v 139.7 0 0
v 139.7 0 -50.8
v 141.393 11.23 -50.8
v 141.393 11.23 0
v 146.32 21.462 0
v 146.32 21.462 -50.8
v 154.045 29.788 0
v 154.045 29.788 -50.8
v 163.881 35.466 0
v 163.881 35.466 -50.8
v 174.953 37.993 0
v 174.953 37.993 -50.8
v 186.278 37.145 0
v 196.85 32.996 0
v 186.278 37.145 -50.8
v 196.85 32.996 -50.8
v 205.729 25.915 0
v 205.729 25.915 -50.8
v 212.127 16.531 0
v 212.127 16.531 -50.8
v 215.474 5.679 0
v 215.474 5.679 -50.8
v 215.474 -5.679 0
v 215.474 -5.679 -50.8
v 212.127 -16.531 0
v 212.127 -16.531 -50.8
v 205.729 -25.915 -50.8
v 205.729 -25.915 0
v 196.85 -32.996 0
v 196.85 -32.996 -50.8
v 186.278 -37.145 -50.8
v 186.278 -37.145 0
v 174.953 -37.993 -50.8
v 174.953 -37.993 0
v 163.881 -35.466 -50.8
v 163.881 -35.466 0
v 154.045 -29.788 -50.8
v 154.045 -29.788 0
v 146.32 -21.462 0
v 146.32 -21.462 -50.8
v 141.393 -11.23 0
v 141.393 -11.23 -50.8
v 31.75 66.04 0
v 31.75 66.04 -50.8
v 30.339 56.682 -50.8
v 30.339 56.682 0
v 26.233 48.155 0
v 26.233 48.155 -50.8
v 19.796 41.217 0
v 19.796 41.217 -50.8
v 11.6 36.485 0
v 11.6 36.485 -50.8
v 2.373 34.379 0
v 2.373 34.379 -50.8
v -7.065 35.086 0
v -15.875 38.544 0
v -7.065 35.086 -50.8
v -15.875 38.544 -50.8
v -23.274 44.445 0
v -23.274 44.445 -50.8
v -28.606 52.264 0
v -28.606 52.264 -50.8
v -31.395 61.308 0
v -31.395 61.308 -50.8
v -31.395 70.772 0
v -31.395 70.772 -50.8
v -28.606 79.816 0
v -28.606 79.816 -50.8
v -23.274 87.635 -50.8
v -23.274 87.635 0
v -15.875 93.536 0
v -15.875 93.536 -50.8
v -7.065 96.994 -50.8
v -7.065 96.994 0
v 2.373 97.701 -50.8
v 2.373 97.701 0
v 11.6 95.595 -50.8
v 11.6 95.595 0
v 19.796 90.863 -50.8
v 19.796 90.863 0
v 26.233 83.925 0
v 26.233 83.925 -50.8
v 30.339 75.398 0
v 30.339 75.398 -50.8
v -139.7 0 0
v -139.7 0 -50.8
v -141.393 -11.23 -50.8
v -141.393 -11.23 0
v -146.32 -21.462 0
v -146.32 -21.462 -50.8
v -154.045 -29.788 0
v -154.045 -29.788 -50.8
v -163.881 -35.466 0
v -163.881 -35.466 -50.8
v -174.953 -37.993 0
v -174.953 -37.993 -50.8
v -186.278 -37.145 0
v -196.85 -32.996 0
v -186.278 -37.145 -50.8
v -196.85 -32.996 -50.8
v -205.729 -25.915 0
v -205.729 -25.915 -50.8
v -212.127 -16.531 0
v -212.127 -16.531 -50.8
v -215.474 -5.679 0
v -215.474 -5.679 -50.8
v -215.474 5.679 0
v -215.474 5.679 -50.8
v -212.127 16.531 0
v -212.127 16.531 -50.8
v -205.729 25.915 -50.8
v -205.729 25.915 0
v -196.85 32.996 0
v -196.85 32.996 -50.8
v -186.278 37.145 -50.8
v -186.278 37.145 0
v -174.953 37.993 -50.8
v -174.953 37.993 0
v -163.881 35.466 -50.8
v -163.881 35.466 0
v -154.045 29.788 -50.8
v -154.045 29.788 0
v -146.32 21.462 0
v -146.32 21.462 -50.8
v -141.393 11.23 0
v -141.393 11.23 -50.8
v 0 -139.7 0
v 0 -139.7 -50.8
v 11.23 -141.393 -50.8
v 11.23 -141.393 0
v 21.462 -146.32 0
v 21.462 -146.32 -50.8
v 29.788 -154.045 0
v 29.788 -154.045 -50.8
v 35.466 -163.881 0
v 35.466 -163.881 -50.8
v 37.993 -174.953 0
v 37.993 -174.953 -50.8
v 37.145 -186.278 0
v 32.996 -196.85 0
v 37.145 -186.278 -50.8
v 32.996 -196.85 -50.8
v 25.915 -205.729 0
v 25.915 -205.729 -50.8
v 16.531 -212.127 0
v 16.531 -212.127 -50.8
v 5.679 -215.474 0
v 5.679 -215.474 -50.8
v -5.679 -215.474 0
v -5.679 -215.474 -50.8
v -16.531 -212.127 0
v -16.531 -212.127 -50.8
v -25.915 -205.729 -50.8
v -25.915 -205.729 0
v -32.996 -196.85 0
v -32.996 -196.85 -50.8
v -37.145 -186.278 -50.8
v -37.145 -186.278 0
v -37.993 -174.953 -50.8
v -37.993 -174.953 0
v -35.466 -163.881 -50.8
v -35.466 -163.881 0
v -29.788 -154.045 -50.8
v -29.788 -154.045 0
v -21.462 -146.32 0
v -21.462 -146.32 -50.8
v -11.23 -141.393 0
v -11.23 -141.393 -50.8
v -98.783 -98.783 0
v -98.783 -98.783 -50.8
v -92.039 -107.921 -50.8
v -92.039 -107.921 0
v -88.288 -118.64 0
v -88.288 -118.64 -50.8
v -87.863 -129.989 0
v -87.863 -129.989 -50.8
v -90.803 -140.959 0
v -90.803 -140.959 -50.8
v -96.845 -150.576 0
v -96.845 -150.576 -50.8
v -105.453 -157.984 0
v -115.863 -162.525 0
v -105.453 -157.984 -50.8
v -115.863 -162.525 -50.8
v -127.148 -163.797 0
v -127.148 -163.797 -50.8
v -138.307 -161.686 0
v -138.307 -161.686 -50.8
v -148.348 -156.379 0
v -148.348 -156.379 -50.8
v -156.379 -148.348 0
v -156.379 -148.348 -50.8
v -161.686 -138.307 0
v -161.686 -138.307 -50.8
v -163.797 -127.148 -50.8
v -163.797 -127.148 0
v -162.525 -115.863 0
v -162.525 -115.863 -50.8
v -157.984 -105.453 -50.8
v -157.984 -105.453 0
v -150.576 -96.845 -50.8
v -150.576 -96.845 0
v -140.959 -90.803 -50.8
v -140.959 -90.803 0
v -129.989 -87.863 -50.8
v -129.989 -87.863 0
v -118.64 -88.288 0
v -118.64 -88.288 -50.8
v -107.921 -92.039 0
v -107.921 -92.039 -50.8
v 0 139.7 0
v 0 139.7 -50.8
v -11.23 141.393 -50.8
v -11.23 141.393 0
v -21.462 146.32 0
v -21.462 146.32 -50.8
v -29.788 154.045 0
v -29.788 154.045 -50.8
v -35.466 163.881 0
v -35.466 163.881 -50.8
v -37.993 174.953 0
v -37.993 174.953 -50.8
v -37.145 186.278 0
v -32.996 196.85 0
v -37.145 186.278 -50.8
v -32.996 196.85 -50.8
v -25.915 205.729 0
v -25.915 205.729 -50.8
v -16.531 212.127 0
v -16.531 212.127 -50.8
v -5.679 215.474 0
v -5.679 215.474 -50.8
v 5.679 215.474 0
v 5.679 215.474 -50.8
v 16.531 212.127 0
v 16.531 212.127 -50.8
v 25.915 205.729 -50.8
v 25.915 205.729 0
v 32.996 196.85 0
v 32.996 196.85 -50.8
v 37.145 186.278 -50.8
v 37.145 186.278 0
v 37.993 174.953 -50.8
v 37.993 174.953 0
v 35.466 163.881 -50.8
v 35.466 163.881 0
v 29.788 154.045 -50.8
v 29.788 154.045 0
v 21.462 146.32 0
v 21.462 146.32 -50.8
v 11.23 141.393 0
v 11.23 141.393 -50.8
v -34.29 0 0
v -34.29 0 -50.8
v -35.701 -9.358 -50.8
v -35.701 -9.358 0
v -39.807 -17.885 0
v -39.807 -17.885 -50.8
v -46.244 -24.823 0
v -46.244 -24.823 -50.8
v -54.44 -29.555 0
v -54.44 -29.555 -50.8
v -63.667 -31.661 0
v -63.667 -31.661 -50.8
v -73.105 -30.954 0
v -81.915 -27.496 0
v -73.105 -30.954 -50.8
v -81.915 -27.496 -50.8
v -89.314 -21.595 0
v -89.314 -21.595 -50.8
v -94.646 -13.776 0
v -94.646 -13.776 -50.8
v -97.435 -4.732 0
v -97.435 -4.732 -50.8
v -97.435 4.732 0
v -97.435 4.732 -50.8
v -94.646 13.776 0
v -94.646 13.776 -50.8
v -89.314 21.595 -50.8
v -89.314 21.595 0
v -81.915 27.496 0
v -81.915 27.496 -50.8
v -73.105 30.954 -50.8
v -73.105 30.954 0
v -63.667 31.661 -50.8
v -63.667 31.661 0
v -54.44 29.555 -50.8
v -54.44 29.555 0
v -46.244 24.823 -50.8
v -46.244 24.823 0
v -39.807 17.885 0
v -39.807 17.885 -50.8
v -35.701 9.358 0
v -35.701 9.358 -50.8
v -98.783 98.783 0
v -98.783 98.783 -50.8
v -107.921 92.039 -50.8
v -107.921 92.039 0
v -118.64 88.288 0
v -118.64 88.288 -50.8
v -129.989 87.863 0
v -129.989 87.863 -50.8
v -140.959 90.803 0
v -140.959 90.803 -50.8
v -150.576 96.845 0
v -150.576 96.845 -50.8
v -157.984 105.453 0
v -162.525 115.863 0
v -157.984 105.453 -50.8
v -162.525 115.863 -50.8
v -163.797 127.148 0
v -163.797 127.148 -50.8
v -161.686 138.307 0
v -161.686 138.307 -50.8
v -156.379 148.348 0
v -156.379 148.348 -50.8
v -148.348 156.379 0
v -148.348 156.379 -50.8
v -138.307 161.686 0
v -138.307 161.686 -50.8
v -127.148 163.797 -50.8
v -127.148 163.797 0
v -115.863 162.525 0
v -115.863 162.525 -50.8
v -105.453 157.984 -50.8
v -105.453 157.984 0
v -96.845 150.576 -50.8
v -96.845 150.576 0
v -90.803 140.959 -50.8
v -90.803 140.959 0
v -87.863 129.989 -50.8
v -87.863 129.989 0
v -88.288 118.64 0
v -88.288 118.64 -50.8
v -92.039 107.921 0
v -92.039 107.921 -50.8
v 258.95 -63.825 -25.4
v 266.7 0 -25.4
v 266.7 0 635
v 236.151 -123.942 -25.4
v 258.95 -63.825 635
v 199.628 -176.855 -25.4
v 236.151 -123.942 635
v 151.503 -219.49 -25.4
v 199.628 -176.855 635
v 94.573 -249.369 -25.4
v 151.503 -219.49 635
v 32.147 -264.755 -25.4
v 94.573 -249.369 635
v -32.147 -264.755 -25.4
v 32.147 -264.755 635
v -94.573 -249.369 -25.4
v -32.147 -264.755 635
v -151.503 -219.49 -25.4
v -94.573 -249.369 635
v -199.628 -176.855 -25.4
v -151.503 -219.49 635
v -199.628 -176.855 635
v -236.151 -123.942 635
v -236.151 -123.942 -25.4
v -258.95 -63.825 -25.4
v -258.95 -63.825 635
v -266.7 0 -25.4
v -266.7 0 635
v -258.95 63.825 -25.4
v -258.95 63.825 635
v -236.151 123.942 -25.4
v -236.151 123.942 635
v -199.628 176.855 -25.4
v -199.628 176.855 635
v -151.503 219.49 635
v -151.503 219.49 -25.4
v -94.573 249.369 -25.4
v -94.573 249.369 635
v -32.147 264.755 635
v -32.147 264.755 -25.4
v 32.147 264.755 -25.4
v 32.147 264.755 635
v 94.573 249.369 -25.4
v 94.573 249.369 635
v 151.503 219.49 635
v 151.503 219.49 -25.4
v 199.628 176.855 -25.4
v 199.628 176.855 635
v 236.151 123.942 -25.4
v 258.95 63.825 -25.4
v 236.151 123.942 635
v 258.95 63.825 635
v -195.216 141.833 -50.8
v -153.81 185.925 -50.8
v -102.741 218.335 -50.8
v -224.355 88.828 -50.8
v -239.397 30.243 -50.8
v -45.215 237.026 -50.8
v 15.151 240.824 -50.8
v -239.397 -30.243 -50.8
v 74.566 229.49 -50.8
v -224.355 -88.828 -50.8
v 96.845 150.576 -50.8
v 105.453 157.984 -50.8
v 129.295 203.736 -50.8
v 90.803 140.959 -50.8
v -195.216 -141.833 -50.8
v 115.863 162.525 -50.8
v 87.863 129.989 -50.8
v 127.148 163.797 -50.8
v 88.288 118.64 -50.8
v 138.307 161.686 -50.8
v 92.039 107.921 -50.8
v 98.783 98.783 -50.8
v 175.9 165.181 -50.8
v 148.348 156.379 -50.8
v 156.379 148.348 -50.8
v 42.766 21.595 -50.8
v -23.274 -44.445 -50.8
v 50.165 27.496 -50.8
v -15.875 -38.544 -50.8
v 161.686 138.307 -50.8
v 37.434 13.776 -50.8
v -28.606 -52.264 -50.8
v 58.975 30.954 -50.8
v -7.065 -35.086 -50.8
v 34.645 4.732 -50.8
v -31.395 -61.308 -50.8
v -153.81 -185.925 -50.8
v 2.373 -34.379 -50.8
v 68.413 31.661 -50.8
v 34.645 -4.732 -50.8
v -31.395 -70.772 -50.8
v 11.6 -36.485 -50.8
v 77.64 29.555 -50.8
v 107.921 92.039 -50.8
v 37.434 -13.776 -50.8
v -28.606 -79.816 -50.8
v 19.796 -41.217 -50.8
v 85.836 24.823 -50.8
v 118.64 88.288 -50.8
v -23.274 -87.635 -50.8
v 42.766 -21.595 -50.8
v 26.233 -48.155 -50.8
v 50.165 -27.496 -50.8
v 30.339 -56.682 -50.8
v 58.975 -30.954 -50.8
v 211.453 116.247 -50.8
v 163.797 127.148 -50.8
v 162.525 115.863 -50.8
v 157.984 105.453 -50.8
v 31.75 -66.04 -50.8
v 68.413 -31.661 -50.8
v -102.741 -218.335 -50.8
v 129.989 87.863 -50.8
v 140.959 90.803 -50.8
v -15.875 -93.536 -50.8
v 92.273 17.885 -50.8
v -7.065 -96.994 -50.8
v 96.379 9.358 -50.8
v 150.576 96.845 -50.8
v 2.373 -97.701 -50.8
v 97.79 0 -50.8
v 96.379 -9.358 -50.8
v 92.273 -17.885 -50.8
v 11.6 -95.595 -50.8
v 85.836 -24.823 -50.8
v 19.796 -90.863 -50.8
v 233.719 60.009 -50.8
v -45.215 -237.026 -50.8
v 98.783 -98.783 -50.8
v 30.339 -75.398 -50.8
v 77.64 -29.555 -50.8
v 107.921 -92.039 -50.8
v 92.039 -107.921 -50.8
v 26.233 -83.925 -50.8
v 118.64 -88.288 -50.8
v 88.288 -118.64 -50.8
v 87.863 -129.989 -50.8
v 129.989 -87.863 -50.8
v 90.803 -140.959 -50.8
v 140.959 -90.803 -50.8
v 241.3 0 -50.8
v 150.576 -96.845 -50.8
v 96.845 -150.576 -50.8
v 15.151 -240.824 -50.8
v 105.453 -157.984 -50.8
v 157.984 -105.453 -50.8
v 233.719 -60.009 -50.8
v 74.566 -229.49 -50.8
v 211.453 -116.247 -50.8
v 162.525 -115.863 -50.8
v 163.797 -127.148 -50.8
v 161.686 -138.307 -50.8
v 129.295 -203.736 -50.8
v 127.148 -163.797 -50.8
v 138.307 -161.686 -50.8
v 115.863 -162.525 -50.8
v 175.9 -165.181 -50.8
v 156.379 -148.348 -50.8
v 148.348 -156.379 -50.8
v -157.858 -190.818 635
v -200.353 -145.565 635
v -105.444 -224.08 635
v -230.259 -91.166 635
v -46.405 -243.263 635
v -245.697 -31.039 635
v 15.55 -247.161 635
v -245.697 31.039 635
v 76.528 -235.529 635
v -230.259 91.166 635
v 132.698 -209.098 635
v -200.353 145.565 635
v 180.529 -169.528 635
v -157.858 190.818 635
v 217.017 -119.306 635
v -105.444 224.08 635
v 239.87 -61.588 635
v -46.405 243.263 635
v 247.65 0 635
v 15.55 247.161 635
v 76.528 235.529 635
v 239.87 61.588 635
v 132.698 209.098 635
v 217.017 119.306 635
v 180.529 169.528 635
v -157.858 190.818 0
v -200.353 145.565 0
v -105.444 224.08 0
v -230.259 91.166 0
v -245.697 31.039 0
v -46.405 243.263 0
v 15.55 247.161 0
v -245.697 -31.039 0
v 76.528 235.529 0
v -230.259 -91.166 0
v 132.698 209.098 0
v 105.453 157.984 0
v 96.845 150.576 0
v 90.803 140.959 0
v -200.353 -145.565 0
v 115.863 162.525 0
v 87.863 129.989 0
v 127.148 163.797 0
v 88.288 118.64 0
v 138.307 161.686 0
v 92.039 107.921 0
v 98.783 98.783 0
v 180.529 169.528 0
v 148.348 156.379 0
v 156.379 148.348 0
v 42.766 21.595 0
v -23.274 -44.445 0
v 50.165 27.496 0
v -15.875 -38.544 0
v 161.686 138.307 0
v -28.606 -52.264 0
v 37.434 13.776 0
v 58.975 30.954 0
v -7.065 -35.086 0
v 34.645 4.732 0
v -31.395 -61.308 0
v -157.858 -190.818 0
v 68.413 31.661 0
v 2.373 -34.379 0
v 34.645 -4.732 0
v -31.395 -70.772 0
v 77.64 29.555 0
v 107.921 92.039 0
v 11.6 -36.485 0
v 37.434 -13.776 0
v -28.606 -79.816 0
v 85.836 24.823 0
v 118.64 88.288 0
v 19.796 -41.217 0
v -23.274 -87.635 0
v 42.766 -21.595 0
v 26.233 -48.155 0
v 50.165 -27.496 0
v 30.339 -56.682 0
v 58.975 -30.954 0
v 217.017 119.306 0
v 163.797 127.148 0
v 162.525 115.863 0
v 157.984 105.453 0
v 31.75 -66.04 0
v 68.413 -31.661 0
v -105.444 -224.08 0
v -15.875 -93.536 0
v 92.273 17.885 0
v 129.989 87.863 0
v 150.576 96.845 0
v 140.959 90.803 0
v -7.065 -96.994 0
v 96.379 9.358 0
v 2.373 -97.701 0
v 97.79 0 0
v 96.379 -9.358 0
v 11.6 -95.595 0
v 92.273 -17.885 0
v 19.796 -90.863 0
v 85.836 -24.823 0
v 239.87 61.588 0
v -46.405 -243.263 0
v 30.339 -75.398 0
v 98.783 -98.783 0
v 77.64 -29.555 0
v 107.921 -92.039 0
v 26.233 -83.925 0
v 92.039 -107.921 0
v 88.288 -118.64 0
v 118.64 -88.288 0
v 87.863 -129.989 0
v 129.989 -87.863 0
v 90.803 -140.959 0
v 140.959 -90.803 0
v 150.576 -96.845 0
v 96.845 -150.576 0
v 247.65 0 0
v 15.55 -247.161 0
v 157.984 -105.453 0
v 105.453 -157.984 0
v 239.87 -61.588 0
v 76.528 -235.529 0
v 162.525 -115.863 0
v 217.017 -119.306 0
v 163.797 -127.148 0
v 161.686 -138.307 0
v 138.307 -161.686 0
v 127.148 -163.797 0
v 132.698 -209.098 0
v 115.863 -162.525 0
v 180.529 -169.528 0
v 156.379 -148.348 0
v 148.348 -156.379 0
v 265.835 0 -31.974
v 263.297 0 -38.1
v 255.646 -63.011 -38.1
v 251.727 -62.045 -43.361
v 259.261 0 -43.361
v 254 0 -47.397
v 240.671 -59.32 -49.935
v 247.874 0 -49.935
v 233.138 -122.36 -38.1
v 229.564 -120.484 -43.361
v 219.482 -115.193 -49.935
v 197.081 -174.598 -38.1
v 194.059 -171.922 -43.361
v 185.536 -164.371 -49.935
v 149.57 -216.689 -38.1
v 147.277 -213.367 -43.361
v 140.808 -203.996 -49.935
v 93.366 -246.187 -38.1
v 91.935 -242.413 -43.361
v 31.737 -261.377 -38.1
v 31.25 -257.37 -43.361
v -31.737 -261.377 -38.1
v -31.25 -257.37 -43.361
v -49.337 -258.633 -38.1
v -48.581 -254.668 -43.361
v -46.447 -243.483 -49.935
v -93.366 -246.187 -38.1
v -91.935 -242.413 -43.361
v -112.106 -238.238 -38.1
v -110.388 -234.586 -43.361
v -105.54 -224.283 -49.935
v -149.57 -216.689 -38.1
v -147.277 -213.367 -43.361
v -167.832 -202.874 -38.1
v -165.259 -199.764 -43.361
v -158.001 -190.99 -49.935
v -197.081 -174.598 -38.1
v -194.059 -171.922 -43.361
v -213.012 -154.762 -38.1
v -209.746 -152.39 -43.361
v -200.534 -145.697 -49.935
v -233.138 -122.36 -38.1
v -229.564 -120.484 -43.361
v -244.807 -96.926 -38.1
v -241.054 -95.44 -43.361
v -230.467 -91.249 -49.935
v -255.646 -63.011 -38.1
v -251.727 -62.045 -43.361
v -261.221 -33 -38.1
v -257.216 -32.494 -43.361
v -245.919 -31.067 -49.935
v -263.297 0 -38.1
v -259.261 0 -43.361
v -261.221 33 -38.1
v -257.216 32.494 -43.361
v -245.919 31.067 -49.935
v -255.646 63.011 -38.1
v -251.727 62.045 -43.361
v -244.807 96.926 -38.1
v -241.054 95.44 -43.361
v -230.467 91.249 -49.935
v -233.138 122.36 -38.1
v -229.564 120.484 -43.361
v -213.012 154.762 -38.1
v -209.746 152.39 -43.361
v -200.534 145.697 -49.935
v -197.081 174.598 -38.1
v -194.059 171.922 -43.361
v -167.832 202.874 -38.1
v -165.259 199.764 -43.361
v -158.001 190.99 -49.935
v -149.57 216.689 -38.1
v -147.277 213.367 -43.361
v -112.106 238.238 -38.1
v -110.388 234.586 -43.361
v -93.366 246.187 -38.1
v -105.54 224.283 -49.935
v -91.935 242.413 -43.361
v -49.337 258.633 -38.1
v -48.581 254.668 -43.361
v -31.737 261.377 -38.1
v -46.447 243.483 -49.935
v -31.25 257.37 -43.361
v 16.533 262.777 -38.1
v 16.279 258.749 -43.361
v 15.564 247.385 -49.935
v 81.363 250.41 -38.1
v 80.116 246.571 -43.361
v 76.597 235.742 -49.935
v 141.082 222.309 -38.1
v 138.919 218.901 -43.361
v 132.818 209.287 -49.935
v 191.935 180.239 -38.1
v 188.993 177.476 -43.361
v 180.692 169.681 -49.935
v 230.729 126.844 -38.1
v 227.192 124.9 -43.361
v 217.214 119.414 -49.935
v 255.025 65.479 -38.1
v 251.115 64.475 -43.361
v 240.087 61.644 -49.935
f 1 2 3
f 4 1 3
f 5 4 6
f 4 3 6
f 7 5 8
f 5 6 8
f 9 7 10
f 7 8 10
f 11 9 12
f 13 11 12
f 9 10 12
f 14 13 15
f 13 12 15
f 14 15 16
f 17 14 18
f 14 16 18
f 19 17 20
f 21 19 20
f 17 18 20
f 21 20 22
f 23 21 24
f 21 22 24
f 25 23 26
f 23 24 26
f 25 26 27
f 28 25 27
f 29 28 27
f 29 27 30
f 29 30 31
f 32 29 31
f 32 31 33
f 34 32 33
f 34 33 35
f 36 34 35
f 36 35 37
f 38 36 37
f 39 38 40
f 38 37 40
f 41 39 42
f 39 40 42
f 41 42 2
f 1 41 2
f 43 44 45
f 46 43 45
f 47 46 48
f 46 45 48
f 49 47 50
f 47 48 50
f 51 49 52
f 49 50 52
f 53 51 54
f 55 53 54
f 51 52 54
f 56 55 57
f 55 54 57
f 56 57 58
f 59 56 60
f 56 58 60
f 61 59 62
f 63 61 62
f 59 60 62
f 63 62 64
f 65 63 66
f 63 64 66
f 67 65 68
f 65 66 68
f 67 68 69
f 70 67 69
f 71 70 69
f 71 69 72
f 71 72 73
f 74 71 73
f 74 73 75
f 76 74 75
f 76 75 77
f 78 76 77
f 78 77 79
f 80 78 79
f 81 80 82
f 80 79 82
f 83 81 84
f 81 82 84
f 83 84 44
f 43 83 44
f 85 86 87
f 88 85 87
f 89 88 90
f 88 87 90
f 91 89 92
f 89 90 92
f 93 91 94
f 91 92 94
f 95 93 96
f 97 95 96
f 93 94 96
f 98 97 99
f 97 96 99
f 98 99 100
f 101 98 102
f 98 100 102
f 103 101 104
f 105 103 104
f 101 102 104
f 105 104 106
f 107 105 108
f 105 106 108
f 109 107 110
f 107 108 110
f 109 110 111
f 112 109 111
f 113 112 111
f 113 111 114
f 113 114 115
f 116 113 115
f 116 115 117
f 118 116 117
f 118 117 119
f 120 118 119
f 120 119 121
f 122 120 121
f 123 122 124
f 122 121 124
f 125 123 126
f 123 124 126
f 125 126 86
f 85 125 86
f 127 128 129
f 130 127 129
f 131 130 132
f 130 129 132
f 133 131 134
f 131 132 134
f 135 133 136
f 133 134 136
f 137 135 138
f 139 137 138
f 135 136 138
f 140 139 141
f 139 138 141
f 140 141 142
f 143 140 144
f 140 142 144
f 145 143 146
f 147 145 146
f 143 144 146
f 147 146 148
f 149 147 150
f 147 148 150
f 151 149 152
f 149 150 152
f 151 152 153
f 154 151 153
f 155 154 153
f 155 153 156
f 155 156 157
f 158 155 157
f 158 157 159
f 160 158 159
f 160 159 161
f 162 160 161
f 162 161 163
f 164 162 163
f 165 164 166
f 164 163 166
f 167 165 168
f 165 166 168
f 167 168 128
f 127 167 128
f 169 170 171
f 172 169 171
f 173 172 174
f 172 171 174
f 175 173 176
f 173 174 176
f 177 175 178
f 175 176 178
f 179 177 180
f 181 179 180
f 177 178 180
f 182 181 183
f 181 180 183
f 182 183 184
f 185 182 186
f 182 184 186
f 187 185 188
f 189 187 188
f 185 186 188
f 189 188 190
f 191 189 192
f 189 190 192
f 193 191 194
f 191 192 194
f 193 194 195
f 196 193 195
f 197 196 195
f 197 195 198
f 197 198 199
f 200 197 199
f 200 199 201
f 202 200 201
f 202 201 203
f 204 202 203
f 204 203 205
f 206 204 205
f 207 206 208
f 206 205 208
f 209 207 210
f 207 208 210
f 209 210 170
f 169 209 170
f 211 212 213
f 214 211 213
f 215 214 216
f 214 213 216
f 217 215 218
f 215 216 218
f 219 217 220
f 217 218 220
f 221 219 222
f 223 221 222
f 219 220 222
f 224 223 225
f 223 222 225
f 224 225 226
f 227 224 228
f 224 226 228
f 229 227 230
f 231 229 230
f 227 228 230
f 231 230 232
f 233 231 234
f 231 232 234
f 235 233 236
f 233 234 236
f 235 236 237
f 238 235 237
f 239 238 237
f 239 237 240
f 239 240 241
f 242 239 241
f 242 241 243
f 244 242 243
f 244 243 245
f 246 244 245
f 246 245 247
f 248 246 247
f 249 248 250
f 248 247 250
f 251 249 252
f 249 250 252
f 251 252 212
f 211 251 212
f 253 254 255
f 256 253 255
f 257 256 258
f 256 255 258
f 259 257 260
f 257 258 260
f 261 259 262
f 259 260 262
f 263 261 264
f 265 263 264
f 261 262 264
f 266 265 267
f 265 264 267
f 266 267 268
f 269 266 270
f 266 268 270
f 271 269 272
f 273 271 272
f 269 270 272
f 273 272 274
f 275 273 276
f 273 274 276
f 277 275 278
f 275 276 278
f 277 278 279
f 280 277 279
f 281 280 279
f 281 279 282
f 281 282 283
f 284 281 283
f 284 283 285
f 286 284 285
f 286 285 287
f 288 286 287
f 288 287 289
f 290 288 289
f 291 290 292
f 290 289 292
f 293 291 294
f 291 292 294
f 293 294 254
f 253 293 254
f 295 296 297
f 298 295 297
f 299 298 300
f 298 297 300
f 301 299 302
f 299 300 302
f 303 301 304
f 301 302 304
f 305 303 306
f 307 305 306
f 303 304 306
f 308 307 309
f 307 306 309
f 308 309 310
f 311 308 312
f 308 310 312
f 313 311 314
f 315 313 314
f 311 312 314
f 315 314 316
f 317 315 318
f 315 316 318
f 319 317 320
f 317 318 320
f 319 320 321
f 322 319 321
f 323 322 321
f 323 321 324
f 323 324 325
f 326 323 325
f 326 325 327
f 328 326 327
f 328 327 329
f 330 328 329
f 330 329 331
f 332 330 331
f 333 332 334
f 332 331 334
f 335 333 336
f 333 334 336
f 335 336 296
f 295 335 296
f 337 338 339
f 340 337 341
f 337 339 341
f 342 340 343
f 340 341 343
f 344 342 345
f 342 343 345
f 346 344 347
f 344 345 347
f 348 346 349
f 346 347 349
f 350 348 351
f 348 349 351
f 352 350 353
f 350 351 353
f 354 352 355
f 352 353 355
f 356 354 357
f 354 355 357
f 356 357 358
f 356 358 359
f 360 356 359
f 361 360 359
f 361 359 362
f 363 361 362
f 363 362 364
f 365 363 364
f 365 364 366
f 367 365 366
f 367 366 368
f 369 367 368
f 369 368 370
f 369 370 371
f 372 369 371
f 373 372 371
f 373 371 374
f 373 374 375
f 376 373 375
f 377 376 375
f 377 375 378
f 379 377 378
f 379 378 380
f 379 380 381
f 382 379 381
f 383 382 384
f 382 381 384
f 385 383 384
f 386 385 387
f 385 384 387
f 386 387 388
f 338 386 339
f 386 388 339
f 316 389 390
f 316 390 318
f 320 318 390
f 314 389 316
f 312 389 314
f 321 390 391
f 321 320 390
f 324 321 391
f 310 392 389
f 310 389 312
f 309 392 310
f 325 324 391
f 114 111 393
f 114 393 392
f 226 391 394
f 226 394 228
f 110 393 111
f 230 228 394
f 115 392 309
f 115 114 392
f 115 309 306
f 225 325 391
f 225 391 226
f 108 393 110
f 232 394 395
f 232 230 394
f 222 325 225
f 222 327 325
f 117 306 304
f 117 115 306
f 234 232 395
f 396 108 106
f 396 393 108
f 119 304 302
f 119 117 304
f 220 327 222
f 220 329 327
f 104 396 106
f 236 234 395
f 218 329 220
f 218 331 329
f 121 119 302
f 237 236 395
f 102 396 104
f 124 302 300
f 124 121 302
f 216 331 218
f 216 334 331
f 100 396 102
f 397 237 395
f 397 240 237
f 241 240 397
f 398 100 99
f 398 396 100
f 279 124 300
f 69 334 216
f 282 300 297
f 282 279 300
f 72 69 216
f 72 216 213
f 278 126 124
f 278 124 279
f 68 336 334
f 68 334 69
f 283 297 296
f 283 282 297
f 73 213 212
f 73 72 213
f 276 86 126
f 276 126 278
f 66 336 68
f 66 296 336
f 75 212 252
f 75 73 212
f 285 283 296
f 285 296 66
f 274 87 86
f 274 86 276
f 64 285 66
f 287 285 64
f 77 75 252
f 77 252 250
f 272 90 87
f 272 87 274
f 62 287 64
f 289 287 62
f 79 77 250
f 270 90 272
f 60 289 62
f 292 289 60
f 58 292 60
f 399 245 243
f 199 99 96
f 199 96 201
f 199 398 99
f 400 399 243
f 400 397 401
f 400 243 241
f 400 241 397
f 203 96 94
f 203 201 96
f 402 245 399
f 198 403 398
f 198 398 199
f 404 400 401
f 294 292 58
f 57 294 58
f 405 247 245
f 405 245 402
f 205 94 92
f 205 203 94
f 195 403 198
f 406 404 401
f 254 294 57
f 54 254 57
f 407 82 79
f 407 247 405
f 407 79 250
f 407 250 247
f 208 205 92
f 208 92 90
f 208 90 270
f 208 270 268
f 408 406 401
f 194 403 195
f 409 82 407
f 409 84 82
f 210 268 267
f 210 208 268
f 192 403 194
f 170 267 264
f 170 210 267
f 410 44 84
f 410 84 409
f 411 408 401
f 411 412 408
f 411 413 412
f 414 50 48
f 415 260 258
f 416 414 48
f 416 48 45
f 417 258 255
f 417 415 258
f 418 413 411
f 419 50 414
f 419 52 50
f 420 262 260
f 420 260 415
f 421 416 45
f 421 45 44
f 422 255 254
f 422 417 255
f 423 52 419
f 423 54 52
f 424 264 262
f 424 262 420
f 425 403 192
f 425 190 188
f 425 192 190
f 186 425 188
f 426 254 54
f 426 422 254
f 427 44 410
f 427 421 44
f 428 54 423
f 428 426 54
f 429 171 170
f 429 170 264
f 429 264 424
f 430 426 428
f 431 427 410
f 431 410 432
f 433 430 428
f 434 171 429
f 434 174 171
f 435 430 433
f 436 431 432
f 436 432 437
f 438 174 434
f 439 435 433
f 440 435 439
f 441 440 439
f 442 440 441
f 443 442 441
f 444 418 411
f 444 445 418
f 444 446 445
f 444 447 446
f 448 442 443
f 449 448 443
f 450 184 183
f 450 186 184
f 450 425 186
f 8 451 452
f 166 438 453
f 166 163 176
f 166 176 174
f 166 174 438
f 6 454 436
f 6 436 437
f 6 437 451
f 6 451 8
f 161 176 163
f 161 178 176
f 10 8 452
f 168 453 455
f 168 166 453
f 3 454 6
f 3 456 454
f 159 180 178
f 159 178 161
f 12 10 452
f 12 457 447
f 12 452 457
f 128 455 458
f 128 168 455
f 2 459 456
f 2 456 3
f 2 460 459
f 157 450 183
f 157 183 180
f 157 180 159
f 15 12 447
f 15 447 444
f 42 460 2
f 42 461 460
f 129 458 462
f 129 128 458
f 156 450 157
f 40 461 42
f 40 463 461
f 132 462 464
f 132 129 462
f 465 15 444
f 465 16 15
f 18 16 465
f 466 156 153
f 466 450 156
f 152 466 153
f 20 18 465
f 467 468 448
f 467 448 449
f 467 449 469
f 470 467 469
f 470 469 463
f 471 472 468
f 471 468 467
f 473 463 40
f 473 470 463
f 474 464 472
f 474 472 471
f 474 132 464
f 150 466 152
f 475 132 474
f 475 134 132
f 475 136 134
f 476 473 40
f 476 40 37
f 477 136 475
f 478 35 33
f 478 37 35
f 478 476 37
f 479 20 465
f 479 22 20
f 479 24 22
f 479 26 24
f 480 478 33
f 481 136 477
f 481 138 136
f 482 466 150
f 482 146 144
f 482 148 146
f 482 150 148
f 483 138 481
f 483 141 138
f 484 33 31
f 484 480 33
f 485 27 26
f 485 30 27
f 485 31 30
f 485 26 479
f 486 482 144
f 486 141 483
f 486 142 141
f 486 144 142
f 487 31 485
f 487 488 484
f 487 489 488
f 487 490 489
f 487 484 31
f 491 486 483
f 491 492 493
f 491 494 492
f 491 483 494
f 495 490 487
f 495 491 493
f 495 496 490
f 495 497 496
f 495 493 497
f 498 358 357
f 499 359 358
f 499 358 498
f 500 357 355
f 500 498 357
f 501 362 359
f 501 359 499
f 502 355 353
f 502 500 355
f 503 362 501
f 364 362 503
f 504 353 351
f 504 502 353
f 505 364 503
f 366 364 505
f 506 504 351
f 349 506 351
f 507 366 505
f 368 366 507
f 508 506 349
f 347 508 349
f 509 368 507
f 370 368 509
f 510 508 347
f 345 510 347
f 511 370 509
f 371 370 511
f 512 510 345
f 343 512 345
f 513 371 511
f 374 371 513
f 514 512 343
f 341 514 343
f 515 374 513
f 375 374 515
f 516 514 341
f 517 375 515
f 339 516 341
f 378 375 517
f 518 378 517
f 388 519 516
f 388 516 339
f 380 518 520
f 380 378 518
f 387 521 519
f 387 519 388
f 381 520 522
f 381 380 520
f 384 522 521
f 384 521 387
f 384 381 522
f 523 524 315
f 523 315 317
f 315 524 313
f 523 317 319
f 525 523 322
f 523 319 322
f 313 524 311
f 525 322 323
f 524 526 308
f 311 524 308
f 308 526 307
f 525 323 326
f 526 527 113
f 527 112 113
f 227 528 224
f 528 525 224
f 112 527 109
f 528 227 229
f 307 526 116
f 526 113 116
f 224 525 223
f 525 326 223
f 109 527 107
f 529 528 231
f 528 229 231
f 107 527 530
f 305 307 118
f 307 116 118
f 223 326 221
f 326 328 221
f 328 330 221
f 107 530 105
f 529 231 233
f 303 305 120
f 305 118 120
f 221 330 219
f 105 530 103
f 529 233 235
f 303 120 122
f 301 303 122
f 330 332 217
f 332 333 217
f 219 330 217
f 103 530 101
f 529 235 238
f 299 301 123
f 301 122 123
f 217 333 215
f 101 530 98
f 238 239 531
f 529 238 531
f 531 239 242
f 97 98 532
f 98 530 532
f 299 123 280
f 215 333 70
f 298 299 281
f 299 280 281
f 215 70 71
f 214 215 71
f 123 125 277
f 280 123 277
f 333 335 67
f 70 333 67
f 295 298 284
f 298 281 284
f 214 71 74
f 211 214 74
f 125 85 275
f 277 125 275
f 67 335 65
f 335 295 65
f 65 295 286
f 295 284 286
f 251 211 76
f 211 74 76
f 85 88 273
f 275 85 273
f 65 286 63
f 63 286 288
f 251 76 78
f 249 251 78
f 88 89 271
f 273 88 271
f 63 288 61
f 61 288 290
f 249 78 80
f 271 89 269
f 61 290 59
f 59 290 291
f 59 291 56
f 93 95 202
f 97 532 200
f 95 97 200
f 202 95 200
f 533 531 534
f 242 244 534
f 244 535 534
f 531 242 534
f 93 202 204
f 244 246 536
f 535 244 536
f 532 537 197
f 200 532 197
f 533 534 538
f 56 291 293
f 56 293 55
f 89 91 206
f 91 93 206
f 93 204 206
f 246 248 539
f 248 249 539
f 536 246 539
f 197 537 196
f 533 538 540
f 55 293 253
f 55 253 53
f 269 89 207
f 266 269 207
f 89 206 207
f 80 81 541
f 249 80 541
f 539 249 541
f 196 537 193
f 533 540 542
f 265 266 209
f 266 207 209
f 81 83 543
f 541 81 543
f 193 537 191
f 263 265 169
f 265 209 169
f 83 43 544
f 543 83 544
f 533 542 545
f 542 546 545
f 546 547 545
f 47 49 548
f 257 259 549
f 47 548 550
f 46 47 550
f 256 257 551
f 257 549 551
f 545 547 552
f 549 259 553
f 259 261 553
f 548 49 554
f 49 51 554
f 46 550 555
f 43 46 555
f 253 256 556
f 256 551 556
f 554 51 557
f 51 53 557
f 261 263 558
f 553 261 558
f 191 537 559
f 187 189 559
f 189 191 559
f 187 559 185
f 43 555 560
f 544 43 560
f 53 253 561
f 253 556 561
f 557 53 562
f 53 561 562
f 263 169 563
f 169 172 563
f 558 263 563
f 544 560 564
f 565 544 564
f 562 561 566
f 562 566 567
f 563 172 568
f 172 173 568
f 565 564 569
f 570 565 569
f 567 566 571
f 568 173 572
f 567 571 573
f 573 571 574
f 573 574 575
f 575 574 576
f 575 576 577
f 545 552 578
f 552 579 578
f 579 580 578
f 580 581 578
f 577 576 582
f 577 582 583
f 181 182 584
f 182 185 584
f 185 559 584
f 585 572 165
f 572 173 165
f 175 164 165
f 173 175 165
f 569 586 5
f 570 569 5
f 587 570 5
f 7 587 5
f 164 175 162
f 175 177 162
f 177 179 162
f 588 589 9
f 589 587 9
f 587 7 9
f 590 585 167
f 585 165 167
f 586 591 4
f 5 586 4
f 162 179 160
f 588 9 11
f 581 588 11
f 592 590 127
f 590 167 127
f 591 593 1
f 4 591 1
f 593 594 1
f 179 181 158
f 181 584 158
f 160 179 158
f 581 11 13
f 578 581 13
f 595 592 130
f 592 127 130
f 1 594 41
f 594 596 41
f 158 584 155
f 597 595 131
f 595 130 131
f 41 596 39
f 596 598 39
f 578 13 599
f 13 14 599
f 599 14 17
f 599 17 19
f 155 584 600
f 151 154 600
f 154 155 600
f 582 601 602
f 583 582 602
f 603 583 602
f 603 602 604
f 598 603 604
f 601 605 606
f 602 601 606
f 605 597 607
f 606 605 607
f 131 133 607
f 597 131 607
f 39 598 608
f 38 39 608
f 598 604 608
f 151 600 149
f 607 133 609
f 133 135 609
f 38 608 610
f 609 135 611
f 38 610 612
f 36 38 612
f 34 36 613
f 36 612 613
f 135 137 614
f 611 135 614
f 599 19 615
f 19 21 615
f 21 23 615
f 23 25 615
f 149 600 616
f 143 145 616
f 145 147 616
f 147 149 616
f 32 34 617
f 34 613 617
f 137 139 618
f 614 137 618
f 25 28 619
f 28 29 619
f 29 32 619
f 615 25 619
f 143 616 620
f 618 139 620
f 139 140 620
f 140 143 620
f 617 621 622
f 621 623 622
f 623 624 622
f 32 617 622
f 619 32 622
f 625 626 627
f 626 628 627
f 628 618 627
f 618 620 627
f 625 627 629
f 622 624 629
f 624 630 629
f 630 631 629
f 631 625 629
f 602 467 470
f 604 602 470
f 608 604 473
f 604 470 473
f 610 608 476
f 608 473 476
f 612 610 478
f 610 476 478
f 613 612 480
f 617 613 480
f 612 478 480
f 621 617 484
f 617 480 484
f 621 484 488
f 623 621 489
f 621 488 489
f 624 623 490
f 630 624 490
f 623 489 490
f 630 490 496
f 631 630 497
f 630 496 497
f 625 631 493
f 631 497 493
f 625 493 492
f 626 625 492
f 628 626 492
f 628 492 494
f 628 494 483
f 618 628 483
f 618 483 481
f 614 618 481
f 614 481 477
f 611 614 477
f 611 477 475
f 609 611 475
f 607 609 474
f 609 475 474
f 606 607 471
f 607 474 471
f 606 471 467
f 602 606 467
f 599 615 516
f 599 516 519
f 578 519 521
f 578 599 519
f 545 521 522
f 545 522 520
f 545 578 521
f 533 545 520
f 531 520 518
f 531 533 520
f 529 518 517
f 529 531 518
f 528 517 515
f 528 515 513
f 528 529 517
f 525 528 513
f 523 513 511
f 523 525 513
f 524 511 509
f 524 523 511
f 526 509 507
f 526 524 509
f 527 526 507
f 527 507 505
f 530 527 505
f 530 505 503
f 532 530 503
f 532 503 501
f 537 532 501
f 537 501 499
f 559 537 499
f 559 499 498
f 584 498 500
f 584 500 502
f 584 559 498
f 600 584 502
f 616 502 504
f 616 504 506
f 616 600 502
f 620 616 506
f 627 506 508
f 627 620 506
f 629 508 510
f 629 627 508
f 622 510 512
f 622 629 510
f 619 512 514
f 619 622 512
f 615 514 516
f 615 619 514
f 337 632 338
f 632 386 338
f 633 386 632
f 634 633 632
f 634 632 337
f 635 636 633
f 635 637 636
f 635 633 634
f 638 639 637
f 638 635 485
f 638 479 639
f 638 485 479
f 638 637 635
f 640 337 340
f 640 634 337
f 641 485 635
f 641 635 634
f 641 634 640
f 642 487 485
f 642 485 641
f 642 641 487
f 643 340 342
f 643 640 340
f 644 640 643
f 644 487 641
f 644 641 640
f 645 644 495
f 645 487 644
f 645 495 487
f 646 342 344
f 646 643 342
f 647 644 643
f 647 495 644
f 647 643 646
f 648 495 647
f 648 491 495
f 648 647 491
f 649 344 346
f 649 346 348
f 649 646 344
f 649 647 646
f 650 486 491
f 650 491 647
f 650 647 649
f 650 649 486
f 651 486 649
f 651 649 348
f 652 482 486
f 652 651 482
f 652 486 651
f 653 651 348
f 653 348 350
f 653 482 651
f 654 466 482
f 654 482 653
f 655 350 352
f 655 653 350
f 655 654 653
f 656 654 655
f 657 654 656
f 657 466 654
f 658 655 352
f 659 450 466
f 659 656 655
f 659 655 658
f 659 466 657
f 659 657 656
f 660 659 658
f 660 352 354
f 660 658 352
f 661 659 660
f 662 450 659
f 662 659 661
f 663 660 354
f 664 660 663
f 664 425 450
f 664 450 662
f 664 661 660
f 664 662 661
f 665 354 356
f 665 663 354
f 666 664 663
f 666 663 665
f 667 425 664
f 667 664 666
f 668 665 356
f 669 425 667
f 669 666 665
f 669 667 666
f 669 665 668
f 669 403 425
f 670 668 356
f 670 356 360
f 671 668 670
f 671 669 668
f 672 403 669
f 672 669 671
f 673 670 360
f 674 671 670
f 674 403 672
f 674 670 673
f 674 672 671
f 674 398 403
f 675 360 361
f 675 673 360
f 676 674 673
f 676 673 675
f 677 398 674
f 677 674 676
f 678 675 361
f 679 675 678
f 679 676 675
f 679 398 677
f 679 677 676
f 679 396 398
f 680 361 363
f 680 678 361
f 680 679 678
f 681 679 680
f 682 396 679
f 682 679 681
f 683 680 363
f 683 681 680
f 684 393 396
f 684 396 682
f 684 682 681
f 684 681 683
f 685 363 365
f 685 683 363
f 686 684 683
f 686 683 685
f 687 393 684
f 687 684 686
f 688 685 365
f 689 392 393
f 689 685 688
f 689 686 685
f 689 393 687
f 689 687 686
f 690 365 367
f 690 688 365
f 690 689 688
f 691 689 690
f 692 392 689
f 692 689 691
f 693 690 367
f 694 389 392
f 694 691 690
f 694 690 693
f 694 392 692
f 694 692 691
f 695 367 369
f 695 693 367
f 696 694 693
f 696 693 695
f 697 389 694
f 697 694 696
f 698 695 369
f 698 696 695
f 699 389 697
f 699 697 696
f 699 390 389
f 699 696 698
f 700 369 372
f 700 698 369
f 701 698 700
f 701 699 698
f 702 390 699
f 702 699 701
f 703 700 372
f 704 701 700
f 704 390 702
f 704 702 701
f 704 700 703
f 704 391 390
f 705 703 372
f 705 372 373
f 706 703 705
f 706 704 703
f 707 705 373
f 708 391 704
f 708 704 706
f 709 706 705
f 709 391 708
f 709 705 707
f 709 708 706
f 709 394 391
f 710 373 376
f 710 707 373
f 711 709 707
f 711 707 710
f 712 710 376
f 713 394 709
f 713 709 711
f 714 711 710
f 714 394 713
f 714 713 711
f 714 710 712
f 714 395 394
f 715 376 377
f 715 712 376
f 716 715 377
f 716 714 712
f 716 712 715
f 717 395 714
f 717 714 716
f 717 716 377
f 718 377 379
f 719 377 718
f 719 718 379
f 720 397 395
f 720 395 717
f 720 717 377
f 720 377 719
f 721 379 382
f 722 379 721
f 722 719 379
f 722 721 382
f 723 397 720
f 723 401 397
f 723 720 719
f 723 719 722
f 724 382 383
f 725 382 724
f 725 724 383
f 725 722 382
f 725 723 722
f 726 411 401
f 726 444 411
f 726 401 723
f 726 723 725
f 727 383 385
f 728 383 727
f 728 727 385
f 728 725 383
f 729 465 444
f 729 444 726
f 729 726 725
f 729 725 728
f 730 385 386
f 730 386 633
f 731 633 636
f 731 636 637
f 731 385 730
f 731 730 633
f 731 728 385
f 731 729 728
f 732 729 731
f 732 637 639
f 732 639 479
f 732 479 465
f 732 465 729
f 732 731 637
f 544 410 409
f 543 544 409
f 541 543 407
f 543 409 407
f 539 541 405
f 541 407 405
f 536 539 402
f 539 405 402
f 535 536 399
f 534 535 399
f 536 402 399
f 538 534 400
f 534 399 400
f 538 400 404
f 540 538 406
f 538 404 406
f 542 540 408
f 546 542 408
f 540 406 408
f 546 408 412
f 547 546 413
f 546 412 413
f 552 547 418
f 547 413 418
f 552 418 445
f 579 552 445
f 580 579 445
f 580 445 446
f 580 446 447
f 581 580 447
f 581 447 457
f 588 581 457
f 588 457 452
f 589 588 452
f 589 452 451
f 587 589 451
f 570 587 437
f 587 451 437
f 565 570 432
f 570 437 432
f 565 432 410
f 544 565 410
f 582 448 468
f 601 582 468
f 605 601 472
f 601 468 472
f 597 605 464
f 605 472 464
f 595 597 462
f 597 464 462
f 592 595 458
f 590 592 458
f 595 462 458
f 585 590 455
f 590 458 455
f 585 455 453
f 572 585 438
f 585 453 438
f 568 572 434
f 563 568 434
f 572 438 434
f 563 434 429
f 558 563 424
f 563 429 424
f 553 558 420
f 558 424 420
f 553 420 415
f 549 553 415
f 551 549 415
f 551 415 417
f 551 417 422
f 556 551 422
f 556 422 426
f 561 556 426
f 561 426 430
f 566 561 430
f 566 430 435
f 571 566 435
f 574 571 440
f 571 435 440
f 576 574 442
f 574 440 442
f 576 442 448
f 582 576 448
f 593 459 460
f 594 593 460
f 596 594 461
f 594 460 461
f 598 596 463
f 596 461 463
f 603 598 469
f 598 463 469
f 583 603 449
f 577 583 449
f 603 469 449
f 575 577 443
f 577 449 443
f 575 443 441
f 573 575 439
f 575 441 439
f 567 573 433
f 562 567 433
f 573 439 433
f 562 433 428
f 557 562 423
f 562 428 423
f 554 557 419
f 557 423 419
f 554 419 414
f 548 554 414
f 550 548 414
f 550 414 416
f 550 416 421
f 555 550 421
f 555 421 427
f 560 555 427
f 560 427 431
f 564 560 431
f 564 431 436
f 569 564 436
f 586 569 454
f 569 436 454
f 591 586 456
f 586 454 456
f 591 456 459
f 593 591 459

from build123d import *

# Parameters (mm, degrees)
F0_R            = 266.7
F0_R_2          = 247.65
F1_DEPTH        = 635
F2_R            = 266.7
F3_DEPTH        = 50.8
F4_R            = 25.4
F5_R            = 38.1
F7_DEPTH        = 50.8
F7_COPIES_COUNT = 8
F8_R            = 31.75
F9_DEPTH        = 50.8


# Not quite as in the source:
# - a pattern or mirror of a feature is missing from the dataset's text; its kind, count and spacing are read off the source's solid
# - a feature names something its author has since deleted; it is built from what else it names


with BuildPart() as f1:
    # F0 (on Top) → F1 (new body)
    with BuildSketch(Plane.XY):
        Circle(F0_R)
        Circle(F0_R_2, mode=Mode.SUBTRACT)
    extrude(amount=F1_DEPTH)

    # F2 (on face) → F3 (join)
    with BuildSketch(Plane(origin=(0, 0, 0), x_dir=(1, 0, 0), z_dir=(0, 0, -1))):
        Circle(F2_R)
    extrude(amount=F3_DEPTH)

    # F4
    f4_edges = [f1.edges().sort_by_distance(p)[0] for p in [
        (-266.7, 0, -50.8),
    ]]
    fillet(f4_edges, radius=F4_R)

    # F5 (on face) → F7 (cut, through all)
    with BuildSketch(Plane(origin=(0, 0, -50.8), x_dir=(1, 0, 0), z_dir=(0, 0, -1))):
        with Locations((-177.8, 0)):
            Circle(F5_R)
    f7 = extrude(amount=-F7_DEPTH, mode=Mode.SUBTRACT)

    # F7_copies: F7 ×8 about axis
    f7_copies_axis = Axis((0, 0, 0), (0, 0, 1))
    for i in range(1, F7_COPIES_COUNT):
        add(f7.rotate(f7_copies_axis, i * 360 / F7_COPIES_COUNT), mode=Mode.SUBTRACT)

    # F8 (on face) → F9 (cut, through all)
    with BuildSketch(Plane(origin=(0, 0, -50.8), x_dir=(1, 0, 0), z_dir=(0, 0, -1))):
        with Locations((0, 66.04)):
            Circle(F8_R)
        with Locations((66.04, 0)):
            Circle(F8_R)
        with Locations((-66.04, 0)):
            Circle(F8_R)
        with Locations((0, -66.04)):
            Circle(F8_R)
    extrude(amount=-F9_DEPTH, mode=Mode.SUBTRACT)


solid = f1.part
